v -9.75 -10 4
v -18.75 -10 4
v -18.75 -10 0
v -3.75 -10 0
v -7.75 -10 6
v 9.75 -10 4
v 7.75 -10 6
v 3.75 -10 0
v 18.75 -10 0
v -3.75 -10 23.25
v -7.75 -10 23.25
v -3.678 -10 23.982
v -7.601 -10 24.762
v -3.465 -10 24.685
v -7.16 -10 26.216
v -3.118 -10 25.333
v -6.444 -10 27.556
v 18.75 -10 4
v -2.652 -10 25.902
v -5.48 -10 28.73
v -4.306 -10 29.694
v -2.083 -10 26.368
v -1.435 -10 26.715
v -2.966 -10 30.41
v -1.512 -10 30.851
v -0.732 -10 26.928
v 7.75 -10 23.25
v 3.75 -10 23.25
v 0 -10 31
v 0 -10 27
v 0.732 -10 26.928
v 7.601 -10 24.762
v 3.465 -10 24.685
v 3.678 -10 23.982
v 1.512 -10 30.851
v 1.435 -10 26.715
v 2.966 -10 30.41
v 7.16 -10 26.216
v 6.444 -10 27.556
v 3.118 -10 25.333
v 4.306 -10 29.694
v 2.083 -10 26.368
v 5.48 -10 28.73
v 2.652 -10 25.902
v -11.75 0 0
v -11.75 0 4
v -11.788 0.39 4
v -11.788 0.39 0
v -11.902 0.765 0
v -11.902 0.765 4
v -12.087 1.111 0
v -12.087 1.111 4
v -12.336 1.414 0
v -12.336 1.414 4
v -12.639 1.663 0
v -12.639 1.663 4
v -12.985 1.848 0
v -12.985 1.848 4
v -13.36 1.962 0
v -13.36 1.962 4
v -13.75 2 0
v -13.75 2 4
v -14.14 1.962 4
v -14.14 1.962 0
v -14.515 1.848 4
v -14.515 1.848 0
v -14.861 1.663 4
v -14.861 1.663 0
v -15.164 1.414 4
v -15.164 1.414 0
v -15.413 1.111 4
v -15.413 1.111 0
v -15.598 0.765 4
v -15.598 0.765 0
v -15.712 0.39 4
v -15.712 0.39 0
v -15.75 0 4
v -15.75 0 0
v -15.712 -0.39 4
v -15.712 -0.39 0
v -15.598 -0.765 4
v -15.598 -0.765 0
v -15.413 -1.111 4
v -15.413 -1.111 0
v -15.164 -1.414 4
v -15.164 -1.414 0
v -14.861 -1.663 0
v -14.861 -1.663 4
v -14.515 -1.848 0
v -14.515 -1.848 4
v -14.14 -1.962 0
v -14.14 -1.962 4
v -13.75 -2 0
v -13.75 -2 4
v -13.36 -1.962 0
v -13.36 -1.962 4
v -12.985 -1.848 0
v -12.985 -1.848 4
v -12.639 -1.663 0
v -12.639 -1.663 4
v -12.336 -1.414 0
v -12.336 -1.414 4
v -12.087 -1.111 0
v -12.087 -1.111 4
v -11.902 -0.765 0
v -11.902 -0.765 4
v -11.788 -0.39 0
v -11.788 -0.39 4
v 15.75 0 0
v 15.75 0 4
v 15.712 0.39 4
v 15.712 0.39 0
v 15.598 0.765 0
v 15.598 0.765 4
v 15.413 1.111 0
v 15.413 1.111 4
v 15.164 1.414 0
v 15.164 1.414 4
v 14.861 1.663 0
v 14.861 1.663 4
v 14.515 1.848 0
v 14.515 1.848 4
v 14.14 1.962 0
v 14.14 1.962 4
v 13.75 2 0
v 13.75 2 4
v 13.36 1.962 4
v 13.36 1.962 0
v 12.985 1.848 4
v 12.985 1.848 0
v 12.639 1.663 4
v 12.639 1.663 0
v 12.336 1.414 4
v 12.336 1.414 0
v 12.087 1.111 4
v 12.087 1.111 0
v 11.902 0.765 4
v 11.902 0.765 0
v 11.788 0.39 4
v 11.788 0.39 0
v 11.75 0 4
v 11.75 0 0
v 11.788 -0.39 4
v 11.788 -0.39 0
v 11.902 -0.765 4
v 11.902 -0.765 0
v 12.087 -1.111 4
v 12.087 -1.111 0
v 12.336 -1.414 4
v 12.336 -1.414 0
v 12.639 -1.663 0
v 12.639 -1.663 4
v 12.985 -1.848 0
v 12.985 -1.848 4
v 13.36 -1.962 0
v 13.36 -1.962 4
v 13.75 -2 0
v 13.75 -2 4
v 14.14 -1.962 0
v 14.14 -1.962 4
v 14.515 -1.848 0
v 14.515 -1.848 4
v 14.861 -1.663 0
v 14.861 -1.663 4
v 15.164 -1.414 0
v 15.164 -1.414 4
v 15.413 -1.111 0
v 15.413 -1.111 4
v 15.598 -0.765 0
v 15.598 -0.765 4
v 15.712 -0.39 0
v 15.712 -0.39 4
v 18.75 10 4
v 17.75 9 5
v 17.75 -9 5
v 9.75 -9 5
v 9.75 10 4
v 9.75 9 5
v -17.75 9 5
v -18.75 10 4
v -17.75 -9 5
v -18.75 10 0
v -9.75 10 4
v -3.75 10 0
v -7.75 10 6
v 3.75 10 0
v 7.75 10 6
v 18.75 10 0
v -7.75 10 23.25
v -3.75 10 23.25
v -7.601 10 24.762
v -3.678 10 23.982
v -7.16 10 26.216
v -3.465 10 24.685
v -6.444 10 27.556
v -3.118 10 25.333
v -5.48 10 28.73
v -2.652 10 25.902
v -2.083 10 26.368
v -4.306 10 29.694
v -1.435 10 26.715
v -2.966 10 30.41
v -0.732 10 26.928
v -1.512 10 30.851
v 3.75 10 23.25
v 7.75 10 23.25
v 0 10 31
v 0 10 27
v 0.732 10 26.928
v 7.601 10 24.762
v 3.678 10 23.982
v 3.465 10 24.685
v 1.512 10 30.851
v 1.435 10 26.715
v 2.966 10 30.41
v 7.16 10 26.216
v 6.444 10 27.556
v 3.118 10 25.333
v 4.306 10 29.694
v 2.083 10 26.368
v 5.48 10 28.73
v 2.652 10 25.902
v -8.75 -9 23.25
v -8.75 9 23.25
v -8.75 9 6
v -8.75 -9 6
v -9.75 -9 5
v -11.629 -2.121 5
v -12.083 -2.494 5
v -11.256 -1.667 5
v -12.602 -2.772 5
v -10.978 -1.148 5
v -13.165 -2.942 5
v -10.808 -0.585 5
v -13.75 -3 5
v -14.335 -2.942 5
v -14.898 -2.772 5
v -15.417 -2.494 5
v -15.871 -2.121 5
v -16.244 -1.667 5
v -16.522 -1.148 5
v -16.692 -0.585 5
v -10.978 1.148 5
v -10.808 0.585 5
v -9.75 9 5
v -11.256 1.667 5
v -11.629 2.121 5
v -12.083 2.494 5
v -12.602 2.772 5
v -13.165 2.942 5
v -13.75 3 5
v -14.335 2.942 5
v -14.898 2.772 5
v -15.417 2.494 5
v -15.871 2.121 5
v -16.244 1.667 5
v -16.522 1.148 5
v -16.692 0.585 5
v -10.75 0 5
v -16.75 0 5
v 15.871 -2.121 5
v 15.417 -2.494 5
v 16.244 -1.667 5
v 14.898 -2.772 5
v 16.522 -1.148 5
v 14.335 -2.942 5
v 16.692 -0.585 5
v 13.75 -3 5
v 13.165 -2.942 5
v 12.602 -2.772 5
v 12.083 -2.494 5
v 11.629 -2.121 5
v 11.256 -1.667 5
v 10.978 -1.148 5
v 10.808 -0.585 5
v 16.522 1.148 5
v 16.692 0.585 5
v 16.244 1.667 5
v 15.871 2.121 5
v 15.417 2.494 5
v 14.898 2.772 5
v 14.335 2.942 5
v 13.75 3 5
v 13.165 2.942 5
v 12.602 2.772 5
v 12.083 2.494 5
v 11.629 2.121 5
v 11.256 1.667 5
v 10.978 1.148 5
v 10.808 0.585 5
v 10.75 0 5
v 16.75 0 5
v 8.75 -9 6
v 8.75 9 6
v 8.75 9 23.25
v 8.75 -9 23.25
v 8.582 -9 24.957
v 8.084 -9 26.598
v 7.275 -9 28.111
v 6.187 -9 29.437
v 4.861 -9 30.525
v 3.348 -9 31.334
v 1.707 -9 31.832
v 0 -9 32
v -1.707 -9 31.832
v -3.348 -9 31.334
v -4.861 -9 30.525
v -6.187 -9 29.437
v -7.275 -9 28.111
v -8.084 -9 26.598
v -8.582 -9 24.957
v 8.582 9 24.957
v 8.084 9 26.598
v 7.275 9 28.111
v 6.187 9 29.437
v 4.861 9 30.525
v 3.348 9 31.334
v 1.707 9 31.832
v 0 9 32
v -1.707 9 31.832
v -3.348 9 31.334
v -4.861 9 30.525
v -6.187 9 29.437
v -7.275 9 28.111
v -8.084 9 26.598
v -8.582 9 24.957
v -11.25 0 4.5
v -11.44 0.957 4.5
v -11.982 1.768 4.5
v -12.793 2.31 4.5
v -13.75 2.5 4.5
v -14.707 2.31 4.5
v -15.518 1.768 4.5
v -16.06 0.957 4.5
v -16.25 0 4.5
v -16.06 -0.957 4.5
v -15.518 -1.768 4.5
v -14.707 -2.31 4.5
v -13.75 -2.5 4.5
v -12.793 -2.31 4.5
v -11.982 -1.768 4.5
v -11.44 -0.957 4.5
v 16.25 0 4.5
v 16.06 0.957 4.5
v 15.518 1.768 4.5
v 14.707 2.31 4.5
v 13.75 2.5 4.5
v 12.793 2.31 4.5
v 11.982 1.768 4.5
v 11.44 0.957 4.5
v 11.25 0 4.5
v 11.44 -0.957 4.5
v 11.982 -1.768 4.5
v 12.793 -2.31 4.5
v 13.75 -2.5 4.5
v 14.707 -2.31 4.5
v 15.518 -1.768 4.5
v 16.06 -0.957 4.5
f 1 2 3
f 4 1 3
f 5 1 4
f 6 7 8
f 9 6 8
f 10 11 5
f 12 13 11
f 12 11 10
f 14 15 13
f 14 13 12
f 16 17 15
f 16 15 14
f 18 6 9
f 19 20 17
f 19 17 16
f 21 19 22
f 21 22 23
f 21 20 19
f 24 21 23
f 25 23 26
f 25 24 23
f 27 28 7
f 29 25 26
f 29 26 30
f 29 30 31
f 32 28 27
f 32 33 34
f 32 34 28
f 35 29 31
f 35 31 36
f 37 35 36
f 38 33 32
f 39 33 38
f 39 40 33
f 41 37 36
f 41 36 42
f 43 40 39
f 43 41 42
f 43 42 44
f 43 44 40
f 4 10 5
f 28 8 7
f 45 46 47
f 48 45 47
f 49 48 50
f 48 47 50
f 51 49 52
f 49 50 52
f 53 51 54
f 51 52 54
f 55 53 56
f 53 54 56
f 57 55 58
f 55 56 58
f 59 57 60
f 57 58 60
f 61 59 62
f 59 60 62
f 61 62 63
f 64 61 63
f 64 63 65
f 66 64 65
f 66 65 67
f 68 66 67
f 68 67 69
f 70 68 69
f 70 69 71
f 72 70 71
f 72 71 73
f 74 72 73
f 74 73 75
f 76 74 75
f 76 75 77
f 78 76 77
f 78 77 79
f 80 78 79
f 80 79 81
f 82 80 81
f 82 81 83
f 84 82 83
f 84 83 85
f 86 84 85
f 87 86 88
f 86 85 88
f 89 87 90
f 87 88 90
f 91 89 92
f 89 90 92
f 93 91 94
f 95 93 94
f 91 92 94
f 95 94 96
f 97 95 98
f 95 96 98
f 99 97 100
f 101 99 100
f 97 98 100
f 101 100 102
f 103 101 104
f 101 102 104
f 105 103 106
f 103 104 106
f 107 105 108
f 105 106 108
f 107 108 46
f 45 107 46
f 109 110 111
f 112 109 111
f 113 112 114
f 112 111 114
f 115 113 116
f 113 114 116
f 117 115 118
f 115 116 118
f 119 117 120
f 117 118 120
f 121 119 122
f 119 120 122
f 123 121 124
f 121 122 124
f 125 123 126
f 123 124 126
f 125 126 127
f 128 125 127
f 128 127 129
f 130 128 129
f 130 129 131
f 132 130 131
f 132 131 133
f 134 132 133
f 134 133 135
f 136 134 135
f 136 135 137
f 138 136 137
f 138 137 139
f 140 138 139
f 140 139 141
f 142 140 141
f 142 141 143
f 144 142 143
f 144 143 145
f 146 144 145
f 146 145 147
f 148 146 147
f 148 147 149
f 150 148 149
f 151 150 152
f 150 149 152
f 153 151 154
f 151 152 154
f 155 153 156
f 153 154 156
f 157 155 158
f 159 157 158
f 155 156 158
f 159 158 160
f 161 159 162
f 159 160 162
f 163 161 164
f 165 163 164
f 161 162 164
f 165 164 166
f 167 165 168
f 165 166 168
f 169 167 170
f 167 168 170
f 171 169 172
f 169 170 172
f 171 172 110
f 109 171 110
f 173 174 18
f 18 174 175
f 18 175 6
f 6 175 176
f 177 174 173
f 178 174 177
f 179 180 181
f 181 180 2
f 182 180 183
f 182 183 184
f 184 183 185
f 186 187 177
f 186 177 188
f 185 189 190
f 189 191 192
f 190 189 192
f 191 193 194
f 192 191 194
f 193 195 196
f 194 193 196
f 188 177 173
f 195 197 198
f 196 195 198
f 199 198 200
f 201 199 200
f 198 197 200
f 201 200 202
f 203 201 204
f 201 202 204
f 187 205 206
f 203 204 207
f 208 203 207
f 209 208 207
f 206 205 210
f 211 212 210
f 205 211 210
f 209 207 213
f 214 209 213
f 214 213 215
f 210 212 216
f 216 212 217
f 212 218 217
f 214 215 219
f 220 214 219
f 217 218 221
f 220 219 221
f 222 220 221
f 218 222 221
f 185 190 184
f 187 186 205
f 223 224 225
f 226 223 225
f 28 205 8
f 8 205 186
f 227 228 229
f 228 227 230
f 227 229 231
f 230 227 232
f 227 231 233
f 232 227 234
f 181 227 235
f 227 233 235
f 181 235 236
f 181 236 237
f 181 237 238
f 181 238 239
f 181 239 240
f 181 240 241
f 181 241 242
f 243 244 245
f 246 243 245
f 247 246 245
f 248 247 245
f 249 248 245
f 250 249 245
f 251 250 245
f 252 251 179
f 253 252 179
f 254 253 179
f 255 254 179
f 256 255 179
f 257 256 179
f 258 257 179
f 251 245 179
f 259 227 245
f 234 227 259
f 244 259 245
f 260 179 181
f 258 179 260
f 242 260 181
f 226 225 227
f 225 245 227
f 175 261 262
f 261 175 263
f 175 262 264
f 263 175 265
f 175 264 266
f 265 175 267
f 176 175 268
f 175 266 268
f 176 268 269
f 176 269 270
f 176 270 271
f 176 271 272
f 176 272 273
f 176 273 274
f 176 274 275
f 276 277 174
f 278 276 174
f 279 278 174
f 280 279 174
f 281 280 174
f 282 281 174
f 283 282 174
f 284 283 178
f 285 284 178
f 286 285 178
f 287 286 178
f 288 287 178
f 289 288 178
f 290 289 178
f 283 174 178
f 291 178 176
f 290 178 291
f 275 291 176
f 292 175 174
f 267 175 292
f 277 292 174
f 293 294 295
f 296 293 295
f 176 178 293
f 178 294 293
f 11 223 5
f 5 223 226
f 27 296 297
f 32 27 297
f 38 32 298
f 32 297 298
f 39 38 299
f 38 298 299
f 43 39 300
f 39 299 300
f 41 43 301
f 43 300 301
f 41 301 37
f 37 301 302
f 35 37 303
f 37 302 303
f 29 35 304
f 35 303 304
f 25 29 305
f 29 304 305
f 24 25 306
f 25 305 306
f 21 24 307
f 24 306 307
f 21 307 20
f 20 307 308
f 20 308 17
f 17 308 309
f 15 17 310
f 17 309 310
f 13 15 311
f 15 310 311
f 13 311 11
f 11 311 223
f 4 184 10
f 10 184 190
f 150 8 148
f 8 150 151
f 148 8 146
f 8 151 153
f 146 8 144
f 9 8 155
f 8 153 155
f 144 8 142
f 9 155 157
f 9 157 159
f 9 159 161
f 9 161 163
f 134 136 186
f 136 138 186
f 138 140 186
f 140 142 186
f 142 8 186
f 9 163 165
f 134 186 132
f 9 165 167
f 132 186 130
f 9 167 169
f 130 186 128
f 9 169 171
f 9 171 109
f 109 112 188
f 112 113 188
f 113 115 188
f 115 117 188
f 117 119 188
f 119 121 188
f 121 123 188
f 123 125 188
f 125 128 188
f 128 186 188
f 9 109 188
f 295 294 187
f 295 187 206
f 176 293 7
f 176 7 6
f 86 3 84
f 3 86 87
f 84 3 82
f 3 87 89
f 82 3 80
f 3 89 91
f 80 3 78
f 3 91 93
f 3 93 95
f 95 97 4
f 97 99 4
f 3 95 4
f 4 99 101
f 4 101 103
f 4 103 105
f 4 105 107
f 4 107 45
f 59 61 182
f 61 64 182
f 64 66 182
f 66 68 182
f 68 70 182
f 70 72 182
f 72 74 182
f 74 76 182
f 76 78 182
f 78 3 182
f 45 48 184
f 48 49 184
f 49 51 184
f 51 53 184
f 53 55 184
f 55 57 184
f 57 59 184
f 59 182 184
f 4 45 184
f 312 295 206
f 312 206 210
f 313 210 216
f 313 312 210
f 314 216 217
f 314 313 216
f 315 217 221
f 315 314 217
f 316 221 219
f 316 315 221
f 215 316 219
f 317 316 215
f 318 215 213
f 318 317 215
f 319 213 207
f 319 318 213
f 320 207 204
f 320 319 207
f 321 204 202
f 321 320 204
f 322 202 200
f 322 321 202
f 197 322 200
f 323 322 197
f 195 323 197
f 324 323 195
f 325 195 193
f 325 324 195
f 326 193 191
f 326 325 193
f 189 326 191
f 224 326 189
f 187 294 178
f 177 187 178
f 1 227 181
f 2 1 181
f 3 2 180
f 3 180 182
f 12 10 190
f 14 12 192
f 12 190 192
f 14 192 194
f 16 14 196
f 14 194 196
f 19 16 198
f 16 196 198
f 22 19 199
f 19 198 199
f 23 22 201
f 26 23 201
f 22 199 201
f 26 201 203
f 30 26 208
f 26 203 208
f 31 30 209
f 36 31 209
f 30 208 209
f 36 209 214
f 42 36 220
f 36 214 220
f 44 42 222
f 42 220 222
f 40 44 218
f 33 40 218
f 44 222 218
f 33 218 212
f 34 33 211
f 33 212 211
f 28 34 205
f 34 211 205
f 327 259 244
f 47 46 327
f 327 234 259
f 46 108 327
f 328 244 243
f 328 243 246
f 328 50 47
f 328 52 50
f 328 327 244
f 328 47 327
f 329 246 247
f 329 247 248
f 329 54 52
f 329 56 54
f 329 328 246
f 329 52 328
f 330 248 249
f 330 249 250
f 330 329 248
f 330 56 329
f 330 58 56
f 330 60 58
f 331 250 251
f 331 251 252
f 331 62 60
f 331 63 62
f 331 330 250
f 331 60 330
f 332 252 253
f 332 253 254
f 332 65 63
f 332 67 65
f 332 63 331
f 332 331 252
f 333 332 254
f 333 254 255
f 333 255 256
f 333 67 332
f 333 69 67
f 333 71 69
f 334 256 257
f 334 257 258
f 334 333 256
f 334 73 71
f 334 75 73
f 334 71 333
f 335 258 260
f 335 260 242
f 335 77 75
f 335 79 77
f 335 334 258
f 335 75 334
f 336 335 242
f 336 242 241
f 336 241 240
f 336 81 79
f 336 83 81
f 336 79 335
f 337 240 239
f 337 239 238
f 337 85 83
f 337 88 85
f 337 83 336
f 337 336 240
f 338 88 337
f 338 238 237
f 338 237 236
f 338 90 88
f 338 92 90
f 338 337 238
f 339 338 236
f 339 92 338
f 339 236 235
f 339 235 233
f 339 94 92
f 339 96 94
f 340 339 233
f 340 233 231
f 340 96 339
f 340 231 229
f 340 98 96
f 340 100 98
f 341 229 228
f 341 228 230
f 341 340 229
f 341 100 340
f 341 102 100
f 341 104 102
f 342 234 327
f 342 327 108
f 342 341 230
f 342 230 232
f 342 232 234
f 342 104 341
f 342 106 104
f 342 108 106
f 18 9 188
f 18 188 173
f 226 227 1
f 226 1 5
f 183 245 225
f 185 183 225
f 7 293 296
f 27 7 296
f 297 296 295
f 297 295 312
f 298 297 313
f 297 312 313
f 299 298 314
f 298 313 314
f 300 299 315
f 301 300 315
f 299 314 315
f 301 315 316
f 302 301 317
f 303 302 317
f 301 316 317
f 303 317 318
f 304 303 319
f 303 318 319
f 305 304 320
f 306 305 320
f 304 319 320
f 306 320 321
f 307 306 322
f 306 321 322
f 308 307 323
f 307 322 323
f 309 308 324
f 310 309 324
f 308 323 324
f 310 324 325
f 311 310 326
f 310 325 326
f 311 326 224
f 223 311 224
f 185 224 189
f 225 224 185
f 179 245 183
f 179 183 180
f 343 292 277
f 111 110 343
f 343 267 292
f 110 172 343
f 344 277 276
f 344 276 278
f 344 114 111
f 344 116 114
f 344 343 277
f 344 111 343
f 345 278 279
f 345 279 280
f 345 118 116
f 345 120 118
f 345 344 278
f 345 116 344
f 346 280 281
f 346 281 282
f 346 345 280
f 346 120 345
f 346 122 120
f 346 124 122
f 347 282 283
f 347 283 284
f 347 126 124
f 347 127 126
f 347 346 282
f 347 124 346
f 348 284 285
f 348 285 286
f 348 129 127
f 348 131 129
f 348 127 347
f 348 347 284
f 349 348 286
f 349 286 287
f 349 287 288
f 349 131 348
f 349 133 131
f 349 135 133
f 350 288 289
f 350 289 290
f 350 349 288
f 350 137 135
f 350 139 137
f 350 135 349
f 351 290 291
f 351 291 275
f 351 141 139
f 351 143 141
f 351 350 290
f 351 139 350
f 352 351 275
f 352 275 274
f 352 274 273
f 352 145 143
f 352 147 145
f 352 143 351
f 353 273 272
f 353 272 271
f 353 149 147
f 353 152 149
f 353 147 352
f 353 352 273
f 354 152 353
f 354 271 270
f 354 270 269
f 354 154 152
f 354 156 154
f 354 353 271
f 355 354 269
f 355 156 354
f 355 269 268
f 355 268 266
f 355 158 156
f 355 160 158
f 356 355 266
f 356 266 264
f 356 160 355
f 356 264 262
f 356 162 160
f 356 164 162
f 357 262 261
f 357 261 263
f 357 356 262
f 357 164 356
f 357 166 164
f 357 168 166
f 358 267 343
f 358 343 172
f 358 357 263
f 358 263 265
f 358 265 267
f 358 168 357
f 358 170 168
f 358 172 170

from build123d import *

# Parameters (mm, degrees)
F1_DEPTH      = 10
F1_DEPTH_BACK = 10
F2_R          = 2
F3_DEPTH      = 25
F4_SIZE       = 1


with BuildPart() as f1:
    # F0 (on Front) → F1 (new body, two sides)
    with BuildSketch(Plane.XZ) as f1_sk:
        with BuildLine():
            Line((3.75, 23.25), (3.75, 0))
            Line((3.75, 0), (18.75, 0))
            Line((18.75, 0), (18.75, 5))
            Line((18.75, 5), (8.75, 5))
            Line((8.75, 5), (8.75, 23.25))
            ThreePointArc((8.75, 23.25), (0, 32), (-8.75, 23.25))
            Line((-8.75, 23.25), (-8.75, 5))
            Line((-8.75, 5), (-18.75, 5))
            Line((-18.75, 5), (-18.75, 0))
            Line((-18.75, 0), (-3.75, 0))
            Line((-3.75, 0), (-3.75, 23.25))
            ThreePointArc((-3.75, 23.25), (0, 27), (3.75, 23.25))
        make_face()
    extrude(amount=-F1_DEPTH)
    extrude(f1_sk.sketch, amount=F1_DEPTH_BACK)

    # F2 (on face) → F3 (cut)
    with BuildSketch(Plane.XY.offset(5)):
        with Locations((-13.75, 0)):
            Circle(F2_R)
        with Locations((13.75, 0)):
            Circle(F2_R)
    extrude(amount=-F3_DEPTH, mode=Mode.SUBTRACT)

    # F4
    f4_edges = [f1.edges().sort_by_distance(p)[0] for p in [
        (11.75, 0, 5),
        (-15.75, 0, 5),
        (13.75, -10, 5),
        (18.75, 0, 5),
        (13.75, 10, 5),
        (8.75, 0, 5),
        (-8.75, 0, 5),
        (-13.75, 10, 5),
        (-13.75, -10, 5),
        (-18.75, 0, 5),
        (8.75, 10, 14.125),
        (0, 10, 32),
        (-8.75, 10, 14.125),
        (8.75, -10, 14.125),
        (0, -10, 32),
        (-8.75, -10, 14.125),
    ]]
    chamfer(f4_edges, length=F4_SIZE)


solid = f1.part
